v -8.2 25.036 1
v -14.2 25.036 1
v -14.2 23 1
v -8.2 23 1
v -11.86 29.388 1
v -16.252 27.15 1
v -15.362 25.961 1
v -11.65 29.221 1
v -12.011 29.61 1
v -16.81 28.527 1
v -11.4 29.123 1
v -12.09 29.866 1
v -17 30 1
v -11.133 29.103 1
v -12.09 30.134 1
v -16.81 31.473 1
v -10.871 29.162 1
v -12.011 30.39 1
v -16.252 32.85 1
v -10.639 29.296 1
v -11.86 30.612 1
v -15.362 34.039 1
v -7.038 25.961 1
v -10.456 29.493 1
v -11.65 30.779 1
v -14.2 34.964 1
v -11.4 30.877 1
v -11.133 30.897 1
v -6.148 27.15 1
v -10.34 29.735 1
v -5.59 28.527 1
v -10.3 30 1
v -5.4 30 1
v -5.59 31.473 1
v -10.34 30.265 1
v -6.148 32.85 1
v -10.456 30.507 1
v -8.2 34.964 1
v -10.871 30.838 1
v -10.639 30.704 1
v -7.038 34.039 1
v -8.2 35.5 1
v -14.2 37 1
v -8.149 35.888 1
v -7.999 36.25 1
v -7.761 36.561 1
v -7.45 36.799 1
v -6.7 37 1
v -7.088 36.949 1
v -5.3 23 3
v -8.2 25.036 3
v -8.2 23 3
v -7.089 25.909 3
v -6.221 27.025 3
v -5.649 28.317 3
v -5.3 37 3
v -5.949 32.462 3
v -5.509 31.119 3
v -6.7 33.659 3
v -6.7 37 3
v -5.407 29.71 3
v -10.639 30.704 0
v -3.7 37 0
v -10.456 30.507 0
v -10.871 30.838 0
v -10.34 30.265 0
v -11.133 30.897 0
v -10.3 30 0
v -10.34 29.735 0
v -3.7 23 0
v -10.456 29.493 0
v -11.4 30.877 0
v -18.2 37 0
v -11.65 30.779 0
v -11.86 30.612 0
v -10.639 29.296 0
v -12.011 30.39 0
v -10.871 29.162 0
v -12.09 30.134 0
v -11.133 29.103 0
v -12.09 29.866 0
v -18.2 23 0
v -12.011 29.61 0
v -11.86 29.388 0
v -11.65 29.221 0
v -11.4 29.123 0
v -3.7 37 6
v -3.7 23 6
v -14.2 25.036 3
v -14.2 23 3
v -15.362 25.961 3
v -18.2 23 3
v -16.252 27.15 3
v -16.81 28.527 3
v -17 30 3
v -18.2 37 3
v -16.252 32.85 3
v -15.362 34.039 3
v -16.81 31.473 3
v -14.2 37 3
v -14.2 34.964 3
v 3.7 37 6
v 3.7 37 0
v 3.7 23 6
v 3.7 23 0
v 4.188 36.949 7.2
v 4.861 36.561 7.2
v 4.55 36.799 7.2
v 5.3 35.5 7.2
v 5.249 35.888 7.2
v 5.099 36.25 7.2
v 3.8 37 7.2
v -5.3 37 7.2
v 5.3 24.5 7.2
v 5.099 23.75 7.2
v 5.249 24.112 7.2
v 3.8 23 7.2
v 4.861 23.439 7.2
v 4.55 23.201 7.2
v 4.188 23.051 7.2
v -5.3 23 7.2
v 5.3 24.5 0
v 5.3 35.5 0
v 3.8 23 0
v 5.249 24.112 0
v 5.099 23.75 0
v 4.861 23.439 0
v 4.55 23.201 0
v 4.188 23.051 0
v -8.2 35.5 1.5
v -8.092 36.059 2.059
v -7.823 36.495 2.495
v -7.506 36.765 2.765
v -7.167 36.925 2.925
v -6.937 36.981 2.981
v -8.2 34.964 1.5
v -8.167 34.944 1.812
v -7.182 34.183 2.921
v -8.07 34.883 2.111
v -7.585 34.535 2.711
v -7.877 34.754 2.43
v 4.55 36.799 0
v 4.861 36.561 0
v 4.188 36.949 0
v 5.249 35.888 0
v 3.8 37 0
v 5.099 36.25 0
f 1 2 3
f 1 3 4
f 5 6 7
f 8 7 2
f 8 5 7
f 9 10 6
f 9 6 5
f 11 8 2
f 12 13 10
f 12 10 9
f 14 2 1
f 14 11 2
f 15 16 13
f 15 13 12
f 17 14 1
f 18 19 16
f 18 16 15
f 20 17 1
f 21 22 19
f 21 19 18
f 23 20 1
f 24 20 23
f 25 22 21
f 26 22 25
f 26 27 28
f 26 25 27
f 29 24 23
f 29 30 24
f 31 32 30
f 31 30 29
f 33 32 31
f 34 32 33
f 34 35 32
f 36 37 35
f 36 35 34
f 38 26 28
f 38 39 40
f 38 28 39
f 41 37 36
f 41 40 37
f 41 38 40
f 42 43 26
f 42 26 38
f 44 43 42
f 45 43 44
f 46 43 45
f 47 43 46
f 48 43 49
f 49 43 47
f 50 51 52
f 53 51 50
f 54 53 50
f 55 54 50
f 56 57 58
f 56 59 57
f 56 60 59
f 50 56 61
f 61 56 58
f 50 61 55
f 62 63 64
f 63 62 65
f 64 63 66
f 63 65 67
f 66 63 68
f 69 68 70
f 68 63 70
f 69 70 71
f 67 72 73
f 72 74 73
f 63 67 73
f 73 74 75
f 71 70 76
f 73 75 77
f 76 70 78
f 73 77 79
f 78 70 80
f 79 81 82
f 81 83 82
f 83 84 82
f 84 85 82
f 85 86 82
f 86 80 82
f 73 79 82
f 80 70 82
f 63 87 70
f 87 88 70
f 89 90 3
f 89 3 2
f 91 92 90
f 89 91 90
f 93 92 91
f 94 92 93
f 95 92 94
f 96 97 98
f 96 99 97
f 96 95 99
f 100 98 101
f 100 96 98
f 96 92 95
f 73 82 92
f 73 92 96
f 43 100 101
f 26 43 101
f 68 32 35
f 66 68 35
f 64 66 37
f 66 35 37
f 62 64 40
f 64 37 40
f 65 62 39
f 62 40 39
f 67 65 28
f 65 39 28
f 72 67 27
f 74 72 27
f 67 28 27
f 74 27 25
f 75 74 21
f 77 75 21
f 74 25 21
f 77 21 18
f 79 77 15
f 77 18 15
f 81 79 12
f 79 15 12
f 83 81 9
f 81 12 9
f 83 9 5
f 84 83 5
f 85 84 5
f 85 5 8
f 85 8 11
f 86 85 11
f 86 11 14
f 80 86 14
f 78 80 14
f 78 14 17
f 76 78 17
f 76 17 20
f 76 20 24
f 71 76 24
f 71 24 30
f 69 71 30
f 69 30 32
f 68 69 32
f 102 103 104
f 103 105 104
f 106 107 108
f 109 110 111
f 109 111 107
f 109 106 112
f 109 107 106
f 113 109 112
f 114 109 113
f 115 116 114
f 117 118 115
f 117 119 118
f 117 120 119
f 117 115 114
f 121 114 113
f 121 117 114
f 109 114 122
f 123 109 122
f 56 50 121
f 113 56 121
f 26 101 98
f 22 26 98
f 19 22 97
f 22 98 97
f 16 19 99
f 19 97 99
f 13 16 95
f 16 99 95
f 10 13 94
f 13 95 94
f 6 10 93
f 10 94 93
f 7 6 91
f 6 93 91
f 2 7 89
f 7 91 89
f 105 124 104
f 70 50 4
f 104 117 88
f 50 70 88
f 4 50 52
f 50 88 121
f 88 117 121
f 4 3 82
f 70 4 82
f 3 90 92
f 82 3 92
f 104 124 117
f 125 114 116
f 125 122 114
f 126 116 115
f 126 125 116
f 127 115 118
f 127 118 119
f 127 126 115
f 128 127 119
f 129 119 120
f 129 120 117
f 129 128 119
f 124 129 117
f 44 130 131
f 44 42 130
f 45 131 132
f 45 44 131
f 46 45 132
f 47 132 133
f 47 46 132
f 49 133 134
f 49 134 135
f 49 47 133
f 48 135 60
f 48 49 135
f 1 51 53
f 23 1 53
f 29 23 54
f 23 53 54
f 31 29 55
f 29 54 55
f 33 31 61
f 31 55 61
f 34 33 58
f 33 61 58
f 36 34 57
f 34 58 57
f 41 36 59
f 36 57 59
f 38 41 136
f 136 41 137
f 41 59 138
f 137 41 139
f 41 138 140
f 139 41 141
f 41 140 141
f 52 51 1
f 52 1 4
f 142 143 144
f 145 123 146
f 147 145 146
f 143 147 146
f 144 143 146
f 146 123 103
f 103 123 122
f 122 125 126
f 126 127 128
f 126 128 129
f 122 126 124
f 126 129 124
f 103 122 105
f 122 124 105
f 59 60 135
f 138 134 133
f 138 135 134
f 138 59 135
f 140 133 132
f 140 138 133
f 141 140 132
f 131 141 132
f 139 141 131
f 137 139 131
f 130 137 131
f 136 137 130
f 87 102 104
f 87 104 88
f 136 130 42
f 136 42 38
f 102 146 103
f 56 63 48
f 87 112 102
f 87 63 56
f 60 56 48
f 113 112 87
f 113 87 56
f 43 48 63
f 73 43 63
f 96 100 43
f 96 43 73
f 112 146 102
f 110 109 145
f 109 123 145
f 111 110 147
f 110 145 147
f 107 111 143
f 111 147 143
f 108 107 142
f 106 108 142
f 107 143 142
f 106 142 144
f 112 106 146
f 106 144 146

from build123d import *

# Parameters (mm, degrees)
PAD_DEPTH       = 7
SKETCH006_W     = 14
SKETCH006_H     = 14
PAD002_DEPTH    = 3
POCKET004_DEPTH = 2
SKETCH008_R     = 0.9
POCKET005_DEPTH = 1.001
FILLET_R        = 1.5


with BuildPart() as clamp_unit:
    # Sketch → Pad (new body, symmetric)
    with BuildSketch(Plane.XZ):
        Polygon((-3.7, 7.2), (5.3, 7.2), (5.3, 0), (3.7, 0), (3.7, 6), (-3.7, 6), (-3.7, 0), (-5.3, 0), (-5.3, 7.2), align=None)
    extrude(amount=PAD_DEPTH, both=True)


with BuildPart() as clone006:
    # Sketch006 → Pad002 (new body)
    with BuildSketch(Plane.XY):
        Rectangle(SKETCH006_W, SKETCH006_H)
    extrude(amount=PAD002_DEPTH)

    # Sketch007 → Pocket004 (cut)
    with BuildSketch(Plane.XY.offset(3)):
        with BuildLine():
            Line((-3, 7), (-3, 4.963869))
            ThreePointArc((-3, 4.963869), (-5.8, 0), (-3, -4.963869))
            Line((-3, -7), (-3, -4.963869))
            Line((3, -7), (-3, -7))
            Line((3, -4.963869), (3, -7))
            ThreePointArc((3, -4.963869), (5.8, 0), (3, 4.963869))
            Line((3, 7), (3, 4.963869))
            Line((-3, 7), (3, 7))
        make_face()
    extrude(amount=-POCKET004_DEPTH, mode=Mode.SUBTRACT)

    # Sketch008 → Pocket005 (cut, through all)
    with BuildSketch(Plane.XY.offset(1)):
        Circle(SKETCH008_R)
    extrude(amount=-POCKET005_DEPTH, mode=Mode.SUBTRACT)


with BuildPart() as clone006_1:
    # Clone placement: moved
    add(clone006.part.moved(Location((-11.2, 0, 0))))

    # Fusion: union clamp-unit
    add(clamp_unit.part)

    # Fillet
    fillet_edges = [clone006_1.edges().sort_by_distance(p)[0] for p in [
        (-8.2, 7, 2),
        (-8.2, 5.981935, 3),
        (5.3, 7, 3.6),
        (5.3, -7, 3.6),
    ]]
    fillet(fillet_edges, radius=FILLET_R)


with BuildPart() as clone006_2:
    # Clone006 placement: moved
    add(clone006_1.part.moved(Location((0, 30, 0))))


solid = clone006_2.part
